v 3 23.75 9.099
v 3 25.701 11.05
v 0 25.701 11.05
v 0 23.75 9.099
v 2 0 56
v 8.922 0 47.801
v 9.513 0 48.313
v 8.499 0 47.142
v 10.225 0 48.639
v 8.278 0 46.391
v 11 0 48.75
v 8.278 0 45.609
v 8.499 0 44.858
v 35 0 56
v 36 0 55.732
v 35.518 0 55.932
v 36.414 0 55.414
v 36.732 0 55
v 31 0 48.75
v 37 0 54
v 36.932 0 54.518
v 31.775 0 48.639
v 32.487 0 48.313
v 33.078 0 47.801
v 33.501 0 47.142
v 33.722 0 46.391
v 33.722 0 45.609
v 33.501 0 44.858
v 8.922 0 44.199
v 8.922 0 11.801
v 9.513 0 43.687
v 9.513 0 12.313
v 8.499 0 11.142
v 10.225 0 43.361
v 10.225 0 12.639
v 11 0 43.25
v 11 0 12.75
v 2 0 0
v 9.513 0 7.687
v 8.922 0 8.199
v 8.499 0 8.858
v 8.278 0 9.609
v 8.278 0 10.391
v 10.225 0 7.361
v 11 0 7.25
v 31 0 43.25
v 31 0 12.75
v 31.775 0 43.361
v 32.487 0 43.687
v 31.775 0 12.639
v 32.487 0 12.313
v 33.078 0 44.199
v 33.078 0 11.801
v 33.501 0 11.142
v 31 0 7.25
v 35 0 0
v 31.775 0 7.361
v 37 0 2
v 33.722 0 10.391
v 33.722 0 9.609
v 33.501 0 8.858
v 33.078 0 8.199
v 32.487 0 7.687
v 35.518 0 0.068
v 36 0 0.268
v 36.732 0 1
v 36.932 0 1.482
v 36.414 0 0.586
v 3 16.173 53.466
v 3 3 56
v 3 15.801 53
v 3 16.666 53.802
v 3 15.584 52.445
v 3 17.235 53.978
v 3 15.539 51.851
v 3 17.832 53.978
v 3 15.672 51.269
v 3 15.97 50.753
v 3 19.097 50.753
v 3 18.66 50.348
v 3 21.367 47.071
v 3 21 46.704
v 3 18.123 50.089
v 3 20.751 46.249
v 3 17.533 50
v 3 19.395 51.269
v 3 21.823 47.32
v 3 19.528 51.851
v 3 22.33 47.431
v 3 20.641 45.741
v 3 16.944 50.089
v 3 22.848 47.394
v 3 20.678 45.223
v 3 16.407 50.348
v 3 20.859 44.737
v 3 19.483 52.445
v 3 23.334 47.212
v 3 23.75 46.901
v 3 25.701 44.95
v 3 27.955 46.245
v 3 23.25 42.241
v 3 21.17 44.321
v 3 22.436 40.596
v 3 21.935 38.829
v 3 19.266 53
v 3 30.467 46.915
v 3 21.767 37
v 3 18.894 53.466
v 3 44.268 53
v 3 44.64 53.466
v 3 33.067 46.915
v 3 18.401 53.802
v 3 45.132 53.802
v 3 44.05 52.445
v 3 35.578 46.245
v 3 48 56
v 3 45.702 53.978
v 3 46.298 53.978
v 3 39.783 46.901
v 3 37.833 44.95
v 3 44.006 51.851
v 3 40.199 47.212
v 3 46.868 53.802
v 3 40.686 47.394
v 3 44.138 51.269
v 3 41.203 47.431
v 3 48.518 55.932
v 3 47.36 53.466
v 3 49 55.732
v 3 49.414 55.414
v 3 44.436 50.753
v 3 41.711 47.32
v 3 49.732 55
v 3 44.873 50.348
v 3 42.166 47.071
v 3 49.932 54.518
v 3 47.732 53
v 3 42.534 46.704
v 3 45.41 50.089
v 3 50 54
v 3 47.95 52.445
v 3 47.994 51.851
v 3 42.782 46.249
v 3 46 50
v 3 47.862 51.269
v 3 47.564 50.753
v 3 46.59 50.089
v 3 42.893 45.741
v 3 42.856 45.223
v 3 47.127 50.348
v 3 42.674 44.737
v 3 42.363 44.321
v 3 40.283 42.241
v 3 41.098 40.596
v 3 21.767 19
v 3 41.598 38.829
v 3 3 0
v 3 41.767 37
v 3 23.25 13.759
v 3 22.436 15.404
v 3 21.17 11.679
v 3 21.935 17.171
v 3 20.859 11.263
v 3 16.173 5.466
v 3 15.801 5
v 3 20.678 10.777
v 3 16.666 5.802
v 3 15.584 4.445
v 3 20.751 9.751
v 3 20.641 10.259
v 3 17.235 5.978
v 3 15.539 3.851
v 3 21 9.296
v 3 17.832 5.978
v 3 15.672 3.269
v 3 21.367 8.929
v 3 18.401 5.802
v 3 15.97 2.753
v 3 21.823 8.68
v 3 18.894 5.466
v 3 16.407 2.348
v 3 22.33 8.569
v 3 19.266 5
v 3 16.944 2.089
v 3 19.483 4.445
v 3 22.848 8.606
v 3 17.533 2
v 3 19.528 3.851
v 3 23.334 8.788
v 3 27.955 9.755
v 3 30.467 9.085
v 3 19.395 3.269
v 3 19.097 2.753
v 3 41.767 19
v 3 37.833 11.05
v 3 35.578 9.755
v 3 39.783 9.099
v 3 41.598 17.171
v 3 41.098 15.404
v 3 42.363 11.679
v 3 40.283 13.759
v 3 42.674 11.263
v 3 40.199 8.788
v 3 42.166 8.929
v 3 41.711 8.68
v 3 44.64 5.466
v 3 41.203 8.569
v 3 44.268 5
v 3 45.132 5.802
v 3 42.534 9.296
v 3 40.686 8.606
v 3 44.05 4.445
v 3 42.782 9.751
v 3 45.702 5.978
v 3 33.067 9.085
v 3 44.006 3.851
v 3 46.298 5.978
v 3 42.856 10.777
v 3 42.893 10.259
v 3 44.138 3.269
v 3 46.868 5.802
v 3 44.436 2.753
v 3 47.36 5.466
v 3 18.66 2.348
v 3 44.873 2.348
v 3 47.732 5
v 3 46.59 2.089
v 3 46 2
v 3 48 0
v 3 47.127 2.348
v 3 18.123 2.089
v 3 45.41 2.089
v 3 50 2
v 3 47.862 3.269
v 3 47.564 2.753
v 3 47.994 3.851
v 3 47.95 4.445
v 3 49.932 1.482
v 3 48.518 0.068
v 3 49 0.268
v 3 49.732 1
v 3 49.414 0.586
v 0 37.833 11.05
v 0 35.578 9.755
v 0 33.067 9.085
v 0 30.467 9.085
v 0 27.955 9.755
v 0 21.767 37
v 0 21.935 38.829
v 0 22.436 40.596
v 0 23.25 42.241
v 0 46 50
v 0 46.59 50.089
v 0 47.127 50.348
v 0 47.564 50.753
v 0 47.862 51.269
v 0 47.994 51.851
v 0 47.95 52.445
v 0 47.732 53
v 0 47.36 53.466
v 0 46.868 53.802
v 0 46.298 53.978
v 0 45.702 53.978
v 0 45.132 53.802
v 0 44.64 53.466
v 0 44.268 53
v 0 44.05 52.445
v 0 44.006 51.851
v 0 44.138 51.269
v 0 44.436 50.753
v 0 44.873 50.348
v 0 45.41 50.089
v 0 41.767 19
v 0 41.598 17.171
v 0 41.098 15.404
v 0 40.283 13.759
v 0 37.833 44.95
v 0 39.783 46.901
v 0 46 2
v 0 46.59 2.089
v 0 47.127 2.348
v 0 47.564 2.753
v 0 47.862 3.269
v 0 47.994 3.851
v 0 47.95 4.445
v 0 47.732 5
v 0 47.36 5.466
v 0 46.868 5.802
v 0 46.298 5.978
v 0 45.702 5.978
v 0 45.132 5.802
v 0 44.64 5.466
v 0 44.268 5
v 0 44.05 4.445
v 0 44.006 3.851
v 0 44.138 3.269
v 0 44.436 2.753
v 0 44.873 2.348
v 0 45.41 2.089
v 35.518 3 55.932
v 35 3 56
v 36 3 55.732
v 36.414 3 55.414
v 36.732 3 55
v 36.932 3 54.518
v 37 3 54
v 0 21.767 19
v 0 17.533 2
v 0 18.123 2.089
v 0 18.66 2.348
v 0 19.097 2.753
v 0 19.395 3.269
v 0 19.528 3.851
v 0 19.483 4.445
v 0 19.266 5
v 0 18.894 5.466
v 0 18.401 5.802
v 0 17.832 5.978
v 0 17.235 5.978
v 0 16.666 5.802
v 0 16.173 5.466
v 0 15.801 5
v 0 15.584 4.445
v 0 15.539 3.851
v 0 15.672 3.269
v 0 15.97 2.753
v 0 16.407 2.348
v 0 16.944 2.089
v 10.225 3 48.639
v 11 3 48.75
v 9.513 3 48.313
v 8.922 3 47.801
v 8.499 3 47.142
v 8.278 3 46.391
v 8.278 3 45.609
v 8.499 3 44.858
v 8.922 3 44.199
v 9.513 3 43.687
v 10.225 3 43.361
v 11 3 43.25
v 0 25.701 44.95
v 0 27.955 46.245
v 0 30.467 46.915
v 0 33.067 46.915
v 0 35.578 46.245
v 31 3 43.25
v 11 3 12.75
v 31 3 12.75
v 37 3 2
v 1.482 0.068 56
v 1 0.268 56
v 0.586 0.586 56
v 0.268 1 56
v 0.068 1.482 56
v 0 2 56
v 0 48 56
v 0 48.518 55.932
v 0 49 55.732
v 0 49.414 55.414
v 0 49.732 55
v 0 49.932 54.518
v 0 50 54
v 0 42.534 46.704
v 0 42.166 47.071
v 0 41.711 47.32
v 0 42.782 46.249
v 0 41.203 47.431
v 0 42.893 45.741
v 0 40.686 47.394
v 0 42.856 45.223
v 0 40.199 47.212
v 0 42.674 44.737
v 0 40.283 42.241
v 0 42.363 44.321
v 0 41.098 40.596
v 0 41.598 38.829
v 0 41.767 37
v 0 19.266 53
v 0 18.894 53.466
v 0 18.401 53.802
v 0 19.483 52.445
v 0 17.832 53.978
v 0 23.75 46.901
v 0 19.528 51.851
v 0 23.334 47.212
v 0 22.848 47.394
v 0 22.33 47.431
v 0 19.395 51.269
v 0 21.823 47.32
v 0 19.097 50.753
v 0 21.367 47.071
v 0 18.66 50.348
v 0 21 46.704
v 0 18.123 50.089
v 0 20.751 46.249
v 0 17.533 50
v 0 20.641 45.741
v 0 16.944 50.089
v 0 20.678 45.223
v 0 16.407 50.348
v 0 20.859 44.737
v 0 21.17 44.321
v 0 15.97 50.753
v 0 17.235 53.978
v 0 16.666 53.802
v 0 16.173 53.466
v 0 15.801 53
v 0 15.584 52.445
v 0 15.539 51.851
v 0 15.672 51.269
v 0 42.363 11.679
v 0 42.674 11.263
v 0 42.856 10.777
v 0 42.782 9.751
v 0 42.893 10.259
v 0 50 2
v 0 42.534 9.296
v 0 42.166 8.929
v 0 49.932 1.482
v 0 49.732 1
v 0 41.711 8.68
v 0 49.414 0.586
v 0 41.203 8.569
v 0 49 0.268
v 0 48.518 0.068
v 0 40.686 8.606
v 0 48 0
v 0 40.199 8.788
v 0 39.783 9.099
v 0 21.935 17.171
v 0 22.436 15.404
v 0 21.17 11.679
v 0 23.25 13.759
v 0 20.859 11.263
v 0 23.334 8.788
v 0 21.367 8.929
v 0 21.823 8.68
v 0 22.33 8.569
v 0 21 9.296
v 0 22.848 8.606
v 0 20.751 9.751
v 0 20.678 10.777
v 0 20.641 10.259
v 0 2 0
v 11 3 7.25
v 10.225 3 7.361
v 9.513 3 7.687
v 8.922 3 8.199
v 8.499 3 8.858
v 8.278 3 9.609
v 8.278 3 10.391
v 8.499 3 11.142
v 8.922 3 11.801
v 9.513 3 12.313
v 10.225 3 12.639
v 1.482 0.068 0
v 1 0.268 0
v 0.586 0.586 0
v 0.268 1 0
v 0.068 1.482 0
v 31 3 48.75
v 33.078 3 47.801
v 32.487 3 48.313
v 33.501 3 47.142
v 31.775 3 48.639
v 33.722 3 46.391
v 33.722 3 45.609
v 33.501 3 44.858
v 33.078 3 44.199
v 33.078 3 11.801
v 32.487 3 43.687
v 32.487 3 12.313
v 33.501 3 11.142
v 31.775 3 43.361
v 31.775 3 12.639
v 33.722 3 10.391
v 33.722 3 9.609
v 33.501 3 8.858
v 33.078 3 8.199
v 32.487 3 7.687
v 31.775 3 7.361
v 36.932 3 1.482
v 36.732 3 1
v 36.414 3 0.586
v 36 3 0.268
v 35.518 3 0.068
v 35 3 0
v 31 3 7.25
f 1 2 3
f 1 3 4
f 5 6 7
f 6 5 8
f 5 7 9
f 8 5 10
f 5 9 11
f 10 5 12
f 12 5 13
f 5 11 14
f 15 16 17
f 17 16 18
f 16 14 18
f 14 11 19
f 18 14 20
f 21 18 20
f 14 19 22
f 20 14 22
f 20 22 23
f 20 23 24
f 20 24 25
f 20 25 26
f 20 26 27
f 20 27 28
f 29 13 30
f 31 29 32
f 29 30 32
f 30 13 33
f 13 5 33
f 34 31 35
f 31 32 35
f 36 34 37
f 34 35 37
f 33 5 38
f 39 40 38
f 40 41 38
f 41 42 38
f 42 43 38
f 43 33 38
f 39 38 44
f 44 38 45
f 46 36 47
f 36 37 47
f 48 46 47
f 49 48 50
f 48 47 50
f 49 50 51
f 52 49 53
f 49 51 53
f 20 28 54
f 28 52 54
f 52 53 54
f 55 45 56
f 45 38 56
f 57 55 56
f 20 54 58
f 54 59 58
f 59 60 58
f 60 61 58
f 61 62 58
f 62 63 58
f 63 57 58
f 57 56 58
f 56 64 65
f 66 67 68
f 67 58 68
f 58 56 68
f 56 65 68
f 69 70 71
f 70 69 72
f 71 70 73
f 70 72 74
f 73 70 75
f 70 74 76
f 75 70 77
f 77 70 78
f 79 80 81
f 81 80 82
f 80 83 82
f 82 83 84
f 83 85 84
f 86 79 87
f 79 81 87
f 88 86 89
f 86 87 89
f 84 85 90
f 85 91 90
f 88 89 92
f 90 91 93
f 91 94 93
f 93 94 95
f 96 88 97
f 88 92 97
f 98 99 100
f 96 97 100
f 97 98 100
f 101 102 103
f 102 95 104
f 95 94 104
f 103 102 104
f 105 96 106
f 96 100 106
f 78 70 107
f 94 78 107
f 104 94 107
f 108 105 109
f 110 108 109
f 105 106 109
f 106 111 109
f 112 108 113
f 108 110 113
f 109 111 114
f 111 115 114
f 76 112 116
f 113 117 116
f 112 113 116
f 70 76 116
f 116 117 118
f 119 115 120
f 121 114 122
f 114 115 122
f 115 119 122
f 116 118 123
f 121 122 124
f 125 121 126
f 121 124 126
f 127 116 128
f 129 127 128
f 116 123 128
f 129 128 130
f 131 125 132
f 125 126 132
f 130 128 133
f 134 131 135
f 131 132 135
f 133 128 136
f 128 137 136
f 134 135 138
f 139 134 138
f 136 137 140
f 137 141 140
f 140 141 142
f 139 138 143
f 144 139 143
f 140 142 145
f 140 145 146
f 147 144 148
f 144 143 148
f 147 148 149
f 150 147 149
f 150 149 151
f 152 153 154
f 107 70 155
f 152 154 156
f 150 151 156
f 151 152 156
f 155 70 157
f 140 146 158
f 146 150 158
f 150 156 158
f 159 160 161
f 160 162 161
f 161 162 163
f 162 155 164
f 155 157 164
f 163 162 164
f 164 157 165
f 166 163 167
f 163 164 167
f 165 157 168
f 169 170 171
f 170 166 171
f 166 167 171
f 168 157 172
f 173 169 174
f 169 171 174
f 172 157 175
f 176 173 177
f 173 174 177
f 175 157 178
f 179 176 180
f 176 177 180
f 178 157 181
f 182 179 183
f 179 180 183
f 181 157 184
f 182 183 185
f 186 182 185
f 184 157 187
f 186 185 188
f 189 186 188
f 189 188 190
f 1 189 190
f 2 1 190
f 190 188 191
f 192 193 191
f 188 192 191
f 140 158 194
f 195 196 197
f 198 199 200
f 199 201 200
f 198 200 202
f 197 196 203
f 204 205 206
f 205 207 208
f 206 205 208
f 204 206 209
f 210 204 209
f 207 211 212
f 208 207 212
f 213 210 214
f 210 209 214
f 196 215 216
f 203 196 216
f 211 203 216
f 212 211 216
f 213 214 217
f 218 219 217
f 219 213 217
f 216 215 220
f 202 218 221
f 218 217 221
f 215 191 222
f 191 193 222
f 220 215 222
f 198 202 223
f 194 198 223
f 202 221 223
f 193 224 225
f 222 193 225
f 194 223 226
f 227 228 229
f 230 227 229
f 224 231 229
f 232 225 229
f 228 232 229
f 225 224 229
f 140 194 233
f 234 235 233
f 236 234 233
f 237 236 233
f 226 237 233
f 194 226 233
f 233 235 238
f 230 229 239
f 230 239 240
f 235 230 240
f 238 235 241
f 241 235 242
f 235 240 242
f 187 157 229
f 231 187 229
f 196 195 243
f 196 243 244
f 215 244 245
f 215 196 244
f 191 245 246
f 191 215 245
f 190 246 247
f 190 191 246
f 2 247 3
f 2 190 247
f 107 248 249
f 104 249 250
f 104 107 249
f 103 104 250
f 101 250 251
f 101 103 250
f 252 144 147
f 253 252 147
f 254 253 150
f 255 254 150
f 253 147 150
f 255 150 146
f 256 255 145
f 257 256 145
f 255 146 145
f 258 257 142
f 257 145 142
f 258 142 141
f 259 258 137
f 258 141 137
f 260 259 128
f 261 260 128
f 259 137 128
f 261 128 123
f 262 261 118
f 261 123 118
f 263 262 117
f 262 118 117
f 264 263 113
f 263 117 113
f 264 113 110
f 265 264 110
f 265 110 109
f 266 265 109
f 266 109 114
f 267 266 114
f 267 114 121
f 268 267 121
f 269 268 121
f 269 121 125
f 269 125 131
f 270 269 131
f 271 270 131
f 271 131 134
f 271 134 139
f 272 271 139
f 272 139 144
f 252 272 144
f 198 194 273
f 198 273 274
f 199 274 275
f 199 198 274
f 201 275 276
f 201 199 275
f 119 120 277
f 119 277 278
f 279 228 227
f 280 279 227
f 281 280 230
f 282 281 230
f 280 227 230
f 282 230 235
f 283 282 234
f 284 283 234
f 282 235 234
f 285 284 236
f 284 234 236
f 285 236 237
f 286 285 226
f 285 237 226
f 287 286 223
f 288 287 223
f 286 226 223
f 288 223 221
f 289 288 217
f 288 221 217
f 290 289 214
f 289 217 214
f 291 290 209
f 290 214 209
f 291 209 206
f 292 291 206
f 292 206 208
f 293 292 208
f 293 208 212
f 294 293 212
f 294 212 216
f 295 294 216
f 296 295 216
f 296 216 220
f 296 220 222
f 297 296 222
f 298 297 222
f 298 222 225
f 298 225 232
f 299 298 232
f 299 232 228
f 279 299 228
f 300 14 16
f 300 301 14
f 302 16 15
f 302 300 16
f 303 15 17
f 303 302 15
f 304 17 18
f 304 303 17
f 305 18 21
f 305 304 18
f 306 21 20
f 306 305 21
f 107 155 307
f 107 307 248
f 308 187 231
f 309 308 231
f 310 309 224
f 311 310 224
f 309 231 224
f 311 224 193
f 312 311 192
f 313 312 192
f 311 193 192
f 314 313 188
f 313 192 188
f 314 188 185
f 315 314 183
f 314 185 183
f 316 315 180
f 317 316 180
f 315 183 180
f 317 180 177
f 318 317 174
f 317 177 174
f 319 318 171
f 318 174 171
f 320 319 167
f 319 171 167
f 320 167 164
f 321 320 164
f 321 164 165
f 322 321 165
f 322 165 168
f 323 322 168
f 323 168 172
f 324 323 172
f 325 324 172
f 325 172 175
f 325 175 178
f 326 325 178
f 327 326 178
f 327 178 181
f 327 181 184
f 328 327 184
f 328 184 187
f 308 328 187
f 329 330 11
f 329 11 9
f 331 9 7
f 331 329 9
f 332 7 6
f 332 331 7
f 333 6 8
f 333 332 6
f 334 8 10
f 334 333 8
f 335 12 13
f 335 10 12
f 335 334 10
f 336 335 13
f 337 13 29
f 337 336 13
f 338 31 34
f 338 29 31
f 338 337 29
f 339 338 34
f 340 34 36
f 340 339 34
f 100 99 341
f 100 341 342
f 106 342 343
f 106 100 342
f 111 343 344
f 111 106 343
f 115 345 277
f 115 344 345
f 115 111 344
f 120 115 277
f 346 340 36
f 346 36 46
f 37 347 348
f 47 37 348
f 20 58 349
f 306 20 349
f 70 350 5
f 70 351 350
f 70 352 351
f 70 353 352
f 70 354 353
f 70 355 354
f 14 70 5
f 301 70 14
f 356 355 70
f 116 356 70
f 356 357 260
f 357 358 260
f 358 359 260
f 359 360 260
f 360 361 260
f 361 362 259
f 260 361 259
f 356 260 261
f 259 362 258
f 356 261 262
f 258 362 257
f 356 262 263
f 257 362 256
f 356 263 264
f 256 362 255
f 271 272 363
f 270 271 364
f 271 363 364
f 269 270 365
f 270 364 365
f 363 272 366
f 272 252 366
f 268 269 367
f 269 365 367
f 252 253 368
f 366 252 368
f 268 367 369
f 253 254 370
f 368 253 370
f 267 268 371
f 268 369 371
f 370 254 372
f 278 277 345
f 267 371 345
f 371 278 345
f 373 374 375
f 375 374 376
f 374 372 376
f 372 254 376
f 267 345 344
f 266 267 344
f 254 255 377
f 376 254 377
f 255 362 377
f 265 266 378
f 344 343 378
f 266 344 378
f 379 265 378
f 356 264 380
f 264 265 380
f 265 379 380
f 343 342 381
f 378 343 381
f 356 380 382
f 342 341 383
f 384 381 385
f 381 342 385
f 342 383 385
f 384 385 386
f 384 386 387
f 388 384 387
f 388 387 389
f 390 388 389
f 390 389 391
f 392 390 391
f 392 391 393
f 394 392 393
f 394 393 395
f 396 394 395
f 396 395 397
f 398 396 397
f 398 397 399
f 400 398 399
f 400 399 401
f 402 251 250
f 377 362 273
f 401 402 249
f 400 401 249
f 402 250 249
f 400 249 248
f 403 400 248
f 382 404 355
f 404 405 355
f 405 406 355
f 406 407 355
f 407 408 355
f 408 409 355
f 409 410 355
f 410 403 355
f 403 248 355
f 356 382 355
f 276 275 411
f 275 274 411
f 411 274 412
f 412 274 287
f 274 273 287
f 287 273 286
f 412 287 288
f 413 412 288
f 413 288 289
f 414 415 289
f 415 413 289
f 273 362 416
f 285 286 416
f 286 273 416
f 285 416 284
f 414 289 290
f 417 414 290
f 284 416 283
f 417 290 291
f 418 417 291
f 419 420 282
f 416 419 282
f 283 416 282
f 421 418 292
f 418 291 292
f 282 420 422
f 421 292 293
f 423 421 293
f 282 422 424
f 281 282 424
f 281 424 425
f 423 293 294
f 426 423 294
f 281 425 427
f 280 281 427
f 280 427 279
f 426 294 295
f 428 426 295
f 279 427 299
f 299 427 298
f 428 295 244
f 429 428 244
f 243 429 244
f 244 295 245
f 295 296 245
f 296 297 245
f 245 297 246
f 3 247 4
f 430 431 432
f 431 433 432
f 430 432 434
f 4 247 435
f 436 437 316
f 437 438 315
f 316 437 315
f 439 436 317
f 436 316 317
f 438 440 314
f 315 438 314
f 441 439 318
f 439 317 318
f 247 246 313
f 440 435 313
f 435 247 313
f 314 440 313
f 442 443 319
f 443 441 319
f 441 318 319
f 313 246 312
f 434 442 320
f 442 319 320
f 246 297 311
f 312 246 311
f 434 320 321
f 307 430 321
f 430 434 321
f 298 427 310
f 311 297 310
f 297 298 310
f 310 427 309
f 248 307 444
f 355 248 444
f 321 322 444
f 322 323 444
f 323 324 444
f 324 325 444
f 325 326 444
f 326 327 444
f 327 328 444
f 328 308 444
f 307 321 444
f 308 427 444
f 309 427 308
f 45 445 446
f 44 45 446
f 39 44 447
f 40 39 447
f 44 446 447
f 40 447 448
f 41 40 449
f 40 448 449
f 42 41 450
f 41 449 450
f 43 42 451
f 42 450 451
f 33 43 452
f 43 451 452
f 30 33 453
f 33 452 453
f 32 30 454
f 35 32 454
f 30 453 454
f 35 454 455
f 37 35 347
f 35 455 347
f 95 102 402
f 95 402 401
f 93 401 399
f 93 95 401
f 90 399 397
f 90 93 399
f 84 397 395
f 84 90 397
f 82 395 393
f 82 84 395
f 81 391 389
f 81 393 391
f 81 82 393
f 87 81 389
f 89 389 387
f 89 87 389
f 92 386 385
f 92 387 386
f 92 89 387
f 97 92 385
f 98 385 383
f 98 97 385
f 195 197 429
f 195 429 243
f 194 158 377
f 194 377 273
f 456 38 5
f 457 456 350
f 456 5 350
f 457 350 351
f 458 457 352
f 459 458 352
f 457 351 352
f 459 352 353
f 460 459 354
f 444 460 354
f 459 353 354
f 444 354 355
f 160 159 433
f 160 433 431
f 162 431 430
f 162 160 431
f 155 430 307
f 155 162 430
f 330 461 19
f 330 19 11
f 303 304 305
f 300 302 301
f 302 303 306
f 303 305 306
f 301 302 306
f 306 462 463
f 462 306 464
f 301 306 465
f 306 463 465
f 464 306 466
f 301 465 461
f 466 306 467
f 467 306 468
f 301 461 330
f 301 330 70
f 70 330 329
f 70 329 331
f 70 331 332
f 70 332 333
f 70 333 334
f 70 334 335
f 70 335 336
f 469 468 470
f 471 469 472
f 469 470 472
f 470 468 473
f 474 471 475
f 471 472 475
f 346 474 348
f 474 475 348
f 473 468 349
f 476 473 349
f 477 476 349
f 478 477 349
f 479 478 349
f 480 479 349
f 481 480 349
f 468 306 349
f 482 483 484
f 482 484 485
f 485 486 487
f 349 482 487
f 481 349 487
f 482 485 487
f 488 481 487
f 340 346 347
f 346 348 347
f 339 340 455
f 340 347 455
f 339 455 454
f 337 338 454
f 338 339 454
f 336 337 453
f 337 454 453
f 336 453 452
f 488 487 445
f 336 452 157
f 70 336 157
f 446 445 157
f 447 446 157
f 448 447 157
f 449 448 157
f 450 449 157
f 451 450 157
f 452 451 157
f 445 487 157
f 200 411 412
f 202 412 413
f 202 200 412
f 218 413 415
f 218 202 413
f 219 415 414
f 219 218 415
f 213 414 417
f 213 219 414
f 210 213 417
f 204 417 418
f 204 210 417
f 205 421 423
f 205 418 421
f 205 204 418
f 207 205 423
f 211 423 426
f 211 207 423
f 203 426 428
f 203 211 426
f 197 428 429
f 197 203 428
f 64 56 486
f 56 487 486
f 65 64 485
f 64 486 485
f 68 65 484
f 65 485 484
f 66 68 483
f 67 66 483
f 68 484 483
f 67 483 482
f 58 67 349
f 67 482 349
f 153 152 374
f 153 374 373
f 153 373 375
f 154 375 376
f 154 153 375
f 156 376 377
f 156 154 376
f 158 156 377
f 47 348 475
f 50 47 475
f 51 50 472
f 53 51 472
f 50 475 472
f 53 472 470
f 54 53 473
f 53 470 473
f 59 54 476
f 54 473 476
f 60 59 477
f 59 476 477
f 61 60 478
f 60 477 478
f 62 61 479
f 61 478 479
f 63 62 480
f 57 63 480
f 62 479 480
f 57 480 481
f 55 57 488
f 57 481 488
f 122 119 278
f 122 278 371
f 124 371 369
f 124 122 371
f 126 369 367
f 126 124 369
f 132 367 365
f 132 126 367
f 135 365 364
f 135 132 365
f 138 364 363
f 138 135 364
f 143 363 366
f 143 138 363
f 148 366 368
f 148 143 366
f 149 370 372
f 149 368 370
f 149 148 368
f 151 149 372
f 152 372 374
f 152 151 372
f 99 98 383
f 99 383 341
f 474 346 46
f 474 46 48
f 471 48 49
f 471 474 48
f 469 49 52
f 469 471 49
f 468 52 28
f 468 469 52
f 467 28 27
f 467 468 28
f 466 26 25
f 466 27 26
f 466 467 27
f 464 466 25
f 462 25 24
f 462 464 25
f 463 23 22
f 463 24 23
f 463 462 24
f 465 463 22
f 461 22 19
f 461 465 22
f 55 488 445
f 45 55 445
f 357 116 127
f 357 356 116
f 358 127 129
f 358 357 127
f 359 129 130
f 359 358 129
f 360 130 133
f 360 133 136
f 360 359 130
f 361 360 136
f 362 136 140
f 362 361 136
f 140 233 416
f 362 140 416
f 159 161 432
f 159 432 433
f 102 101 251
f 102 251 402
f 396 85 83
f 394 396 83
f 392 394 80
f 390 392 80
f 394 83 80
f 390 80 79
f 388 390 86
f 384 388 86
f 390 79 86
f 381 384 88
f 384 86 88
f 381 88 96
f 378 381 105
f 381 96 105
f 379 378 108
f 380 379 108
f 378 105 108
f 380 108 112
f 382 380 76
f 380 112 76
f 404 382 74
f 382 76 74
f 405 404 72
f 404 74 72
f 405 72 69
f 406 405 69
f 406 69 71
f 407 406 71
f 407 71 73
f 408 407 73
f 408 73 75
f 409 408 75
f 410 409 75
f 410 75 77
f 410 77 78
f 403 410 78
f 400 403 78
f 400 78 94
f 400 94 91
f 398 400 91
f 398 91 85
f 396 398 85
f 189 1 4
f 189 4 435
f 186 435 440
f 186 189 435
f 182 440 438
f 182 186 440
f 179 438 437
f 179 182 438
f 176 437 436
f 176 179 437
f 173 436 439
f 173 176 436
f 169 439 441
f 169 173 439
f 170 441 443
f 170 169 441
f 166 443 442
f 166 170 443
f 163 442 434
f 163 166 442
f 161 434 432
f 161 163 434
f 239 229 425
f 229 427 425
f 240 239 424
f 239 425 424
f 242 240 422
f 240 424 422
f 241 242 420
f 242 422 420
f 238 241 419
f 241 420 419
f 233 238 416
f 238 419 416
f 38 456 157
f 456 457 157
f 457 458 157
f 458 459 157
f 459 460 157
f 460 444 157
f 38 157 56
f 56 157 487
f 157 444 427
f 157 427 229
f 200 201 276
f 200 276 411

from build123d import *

# Parameters (mm, degrees)
EXTRUDE_1_DEPTH     = 56
CUT_EXTRUDE_1_DEPTH = 56
SKETCH_3_R          = 2
CUT_EXTRUDE_2_DEPTH = 4
FILLET_1_R          = 2


with BuildPart() as part:
    # 草图1 → 凸台-拉伸1 (new body)
    with BuildSketch(Plane.XY):
        Polygon((0, 0), (37, 0), (37, 3), (3, 3), (3, 50), (0, 50), align=None)
    extrude(amount=EXTRUDE_1_DEPTH)

    # 草图2 → 切除-拉伸1 (cut)
    with BuildSketch(Plane(origin=(0, 3, 0), x_dir=(1, 0, 0), z_dir=(0, 1, 0))):
        with BuildLine():
            Line((11, -12.75), (31, -12.75))
            ThreePointArc((31, -12.75), (33.75, -10), (31, -7.25))
            Line((31, -7.25), (11, -7.25))
            ThreePointArc((11, -7.25), (8.25, -10), (11, -12.75))
        make_face()
        with BuildLine():
            Line((11, -43.25), (31, -43.25))
            ThreePointArc((31, -43.25), (33.75, -46), (31, -48.75))
            Line((31, -48.75), (11, -48.75))
            ThreePointArc((11, -48.75), (8.25, -46), (11, -43.25))
        make_face()
    extrude(amount=-CUT_EXTRUDE_1_DEPTH, mode=Mode.SUBTRACT)

    # 草图3 → 切除-拉伸2 (cut, through all)
    with BuildSketch(Plane(origin=(3, 0, 0), x_dir=(0, 0, -1), z_dir=(1, 0, 0))):
        with Locations((-52, 46)):
            Circle(SKETCH_3_R)
        with Locations((-4, 46)):
            Circle(SKETCH_3_R)
        with Locations((-4, 17.533468943)):
            Circle(SKETCH_3_R)
        with Locations((-52, 17.533468943)):
            Circle(SKETCH_3_R)
        with BuildLine():
            Line((-37, 41.766734471), (-19, 41.766734471))
            ThreePointArc((-19, 41.766734471), (-16.276373136, 41.388681089), (-13.758681543, 40.283105813))
            Line((-13.758681543, 40.283105813), (-11.678664761, 42.363122594))
            ThreePointArc((-11.678664761, 42.363122594), (-9.099000833, 42.363122594), (-9.099000833, 39.783458666))
            Line((-9.099000833, 39.783458666), (-11.049840185, 37.832619314))
            ThreePointArc((-11.049840185, 37.832619314), (-9, 31.766734471), (-11.049840185, 25.700849629))
            Line((-11.049840185, 25.700849629), (-9.099000833, 23.750010277))
            ThreePointArc((-9.099000833, 23.750010277), (-9.099000833, 21.170346349), (-11.678664761, 21.170346349))
            Line((-11.678664761, 21.170346349), (-13.758681543, 23.25036313))
            ThreePointArc((-13.758681543, 23.25036313), (-16.276373136, 22.144787854), (-19, 21.766734471))
            Line((-19, 21.766734471), (-37, 21.766734471))
            ThreePointArc((-37, 21.766734471), (-39.723626864, 22.144787854), (-42.241318457, 23.25036313))
            Line((-42.241318457, 23.25036313), (-44.321335239, 21.170346349))
            ThreePointArc((-44.321335239, 21.170346349), (-46.900999167, 21.170346349), (-46.900999167, 23.750010277))
            Line((-46.900999167, 23.750010277), (-44.950159815, 25.700849629))
            ThreePointArc((-44.950159815, 25.700849629), (-47, 31.766734471), (-44.950159815, 37.832619314))
            Line((-44.950159815, 37.832619314), (-46.900999167, 39.783458666))
            ThreePointArc((-46.900999167, 39.783458666), (-46.900999167, 42.363122594), (-44.321335239, 42.363122594))
            Line((-44.321335239, 42.363122594), (-42.241318457, 40.283105813))
            ThreePointArc((-42.241318457, 40.283105813), (-39.723626864, 41.388681089), (-37, 41.766734471))
        make_face()
    extrude(amount=-CUT_EXTRUDE_2_DEPTH, mode=Mode.SUBTRACT)

    # 圆角1
    fillet_1_edges = [part.edges().sort_by_distance(p)[0] for p in [
        (37, 1.5, 56),
        (0, 0, 28),
        (1.5, 50, 56),
        (1.5, 50, 0),
        (37, 1.5, 0),
    ]]
    fillet(fillet_1_edges, radius=FILLET_1_R)


solid = part.part
